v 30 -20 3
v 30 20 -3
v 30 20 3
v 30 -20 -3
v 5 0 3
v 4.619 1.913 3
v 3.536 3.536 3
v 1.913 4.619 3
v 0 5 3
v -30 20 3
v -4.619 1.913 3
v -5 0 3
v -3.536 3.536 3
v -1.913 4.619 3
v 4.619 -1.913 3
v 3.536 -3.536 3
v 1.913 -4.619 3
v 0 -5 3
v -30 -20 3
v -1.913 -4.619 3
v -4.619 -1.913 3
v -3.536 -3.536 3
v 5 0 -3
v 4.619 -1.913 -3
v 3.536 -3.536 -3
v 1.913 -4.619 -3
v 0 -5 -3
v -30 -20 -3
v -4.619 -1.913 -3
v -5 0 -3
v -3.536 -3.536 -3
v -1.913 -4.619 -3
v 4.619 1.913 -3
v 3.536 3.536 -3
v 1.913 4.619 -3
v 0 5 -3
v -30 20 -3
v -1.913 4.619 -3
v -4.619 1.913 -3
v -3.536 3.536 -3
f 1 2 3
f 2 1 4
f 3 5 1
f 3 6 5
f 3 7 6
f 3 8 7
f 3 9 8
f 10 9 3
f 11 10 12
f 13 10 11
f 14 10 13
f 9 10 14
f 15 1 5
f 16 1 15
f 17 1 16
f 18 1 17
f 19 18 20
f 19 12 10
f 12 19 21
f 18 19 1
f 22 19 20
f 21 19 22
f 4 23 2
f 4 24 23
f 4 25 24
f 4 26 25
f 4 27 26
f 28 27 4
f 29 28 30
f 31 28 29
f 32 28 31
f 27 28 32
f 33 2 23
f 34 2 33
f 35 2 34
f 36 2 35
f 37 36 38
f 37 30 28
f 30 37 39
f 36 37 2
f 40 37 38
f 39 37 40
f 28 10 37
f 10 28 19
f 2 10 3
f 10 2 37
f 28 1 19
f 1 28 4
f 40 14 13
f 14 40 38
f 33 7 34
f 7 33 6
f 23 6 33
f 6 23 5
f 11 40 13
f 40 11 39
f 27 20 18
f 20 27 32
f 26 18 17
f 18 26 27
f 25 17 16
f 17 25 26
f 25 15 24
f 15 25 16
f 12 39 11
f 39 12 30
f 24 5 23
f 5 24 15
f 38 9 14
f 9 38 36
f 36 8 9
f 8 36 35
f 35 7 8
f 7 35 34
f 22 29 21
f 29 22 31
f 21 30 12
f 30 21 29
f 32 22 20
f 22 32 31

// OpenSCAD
difference() {
  cube([60,40,6], center=true);
  cylinder(r=5, h=8, center=true);
}
